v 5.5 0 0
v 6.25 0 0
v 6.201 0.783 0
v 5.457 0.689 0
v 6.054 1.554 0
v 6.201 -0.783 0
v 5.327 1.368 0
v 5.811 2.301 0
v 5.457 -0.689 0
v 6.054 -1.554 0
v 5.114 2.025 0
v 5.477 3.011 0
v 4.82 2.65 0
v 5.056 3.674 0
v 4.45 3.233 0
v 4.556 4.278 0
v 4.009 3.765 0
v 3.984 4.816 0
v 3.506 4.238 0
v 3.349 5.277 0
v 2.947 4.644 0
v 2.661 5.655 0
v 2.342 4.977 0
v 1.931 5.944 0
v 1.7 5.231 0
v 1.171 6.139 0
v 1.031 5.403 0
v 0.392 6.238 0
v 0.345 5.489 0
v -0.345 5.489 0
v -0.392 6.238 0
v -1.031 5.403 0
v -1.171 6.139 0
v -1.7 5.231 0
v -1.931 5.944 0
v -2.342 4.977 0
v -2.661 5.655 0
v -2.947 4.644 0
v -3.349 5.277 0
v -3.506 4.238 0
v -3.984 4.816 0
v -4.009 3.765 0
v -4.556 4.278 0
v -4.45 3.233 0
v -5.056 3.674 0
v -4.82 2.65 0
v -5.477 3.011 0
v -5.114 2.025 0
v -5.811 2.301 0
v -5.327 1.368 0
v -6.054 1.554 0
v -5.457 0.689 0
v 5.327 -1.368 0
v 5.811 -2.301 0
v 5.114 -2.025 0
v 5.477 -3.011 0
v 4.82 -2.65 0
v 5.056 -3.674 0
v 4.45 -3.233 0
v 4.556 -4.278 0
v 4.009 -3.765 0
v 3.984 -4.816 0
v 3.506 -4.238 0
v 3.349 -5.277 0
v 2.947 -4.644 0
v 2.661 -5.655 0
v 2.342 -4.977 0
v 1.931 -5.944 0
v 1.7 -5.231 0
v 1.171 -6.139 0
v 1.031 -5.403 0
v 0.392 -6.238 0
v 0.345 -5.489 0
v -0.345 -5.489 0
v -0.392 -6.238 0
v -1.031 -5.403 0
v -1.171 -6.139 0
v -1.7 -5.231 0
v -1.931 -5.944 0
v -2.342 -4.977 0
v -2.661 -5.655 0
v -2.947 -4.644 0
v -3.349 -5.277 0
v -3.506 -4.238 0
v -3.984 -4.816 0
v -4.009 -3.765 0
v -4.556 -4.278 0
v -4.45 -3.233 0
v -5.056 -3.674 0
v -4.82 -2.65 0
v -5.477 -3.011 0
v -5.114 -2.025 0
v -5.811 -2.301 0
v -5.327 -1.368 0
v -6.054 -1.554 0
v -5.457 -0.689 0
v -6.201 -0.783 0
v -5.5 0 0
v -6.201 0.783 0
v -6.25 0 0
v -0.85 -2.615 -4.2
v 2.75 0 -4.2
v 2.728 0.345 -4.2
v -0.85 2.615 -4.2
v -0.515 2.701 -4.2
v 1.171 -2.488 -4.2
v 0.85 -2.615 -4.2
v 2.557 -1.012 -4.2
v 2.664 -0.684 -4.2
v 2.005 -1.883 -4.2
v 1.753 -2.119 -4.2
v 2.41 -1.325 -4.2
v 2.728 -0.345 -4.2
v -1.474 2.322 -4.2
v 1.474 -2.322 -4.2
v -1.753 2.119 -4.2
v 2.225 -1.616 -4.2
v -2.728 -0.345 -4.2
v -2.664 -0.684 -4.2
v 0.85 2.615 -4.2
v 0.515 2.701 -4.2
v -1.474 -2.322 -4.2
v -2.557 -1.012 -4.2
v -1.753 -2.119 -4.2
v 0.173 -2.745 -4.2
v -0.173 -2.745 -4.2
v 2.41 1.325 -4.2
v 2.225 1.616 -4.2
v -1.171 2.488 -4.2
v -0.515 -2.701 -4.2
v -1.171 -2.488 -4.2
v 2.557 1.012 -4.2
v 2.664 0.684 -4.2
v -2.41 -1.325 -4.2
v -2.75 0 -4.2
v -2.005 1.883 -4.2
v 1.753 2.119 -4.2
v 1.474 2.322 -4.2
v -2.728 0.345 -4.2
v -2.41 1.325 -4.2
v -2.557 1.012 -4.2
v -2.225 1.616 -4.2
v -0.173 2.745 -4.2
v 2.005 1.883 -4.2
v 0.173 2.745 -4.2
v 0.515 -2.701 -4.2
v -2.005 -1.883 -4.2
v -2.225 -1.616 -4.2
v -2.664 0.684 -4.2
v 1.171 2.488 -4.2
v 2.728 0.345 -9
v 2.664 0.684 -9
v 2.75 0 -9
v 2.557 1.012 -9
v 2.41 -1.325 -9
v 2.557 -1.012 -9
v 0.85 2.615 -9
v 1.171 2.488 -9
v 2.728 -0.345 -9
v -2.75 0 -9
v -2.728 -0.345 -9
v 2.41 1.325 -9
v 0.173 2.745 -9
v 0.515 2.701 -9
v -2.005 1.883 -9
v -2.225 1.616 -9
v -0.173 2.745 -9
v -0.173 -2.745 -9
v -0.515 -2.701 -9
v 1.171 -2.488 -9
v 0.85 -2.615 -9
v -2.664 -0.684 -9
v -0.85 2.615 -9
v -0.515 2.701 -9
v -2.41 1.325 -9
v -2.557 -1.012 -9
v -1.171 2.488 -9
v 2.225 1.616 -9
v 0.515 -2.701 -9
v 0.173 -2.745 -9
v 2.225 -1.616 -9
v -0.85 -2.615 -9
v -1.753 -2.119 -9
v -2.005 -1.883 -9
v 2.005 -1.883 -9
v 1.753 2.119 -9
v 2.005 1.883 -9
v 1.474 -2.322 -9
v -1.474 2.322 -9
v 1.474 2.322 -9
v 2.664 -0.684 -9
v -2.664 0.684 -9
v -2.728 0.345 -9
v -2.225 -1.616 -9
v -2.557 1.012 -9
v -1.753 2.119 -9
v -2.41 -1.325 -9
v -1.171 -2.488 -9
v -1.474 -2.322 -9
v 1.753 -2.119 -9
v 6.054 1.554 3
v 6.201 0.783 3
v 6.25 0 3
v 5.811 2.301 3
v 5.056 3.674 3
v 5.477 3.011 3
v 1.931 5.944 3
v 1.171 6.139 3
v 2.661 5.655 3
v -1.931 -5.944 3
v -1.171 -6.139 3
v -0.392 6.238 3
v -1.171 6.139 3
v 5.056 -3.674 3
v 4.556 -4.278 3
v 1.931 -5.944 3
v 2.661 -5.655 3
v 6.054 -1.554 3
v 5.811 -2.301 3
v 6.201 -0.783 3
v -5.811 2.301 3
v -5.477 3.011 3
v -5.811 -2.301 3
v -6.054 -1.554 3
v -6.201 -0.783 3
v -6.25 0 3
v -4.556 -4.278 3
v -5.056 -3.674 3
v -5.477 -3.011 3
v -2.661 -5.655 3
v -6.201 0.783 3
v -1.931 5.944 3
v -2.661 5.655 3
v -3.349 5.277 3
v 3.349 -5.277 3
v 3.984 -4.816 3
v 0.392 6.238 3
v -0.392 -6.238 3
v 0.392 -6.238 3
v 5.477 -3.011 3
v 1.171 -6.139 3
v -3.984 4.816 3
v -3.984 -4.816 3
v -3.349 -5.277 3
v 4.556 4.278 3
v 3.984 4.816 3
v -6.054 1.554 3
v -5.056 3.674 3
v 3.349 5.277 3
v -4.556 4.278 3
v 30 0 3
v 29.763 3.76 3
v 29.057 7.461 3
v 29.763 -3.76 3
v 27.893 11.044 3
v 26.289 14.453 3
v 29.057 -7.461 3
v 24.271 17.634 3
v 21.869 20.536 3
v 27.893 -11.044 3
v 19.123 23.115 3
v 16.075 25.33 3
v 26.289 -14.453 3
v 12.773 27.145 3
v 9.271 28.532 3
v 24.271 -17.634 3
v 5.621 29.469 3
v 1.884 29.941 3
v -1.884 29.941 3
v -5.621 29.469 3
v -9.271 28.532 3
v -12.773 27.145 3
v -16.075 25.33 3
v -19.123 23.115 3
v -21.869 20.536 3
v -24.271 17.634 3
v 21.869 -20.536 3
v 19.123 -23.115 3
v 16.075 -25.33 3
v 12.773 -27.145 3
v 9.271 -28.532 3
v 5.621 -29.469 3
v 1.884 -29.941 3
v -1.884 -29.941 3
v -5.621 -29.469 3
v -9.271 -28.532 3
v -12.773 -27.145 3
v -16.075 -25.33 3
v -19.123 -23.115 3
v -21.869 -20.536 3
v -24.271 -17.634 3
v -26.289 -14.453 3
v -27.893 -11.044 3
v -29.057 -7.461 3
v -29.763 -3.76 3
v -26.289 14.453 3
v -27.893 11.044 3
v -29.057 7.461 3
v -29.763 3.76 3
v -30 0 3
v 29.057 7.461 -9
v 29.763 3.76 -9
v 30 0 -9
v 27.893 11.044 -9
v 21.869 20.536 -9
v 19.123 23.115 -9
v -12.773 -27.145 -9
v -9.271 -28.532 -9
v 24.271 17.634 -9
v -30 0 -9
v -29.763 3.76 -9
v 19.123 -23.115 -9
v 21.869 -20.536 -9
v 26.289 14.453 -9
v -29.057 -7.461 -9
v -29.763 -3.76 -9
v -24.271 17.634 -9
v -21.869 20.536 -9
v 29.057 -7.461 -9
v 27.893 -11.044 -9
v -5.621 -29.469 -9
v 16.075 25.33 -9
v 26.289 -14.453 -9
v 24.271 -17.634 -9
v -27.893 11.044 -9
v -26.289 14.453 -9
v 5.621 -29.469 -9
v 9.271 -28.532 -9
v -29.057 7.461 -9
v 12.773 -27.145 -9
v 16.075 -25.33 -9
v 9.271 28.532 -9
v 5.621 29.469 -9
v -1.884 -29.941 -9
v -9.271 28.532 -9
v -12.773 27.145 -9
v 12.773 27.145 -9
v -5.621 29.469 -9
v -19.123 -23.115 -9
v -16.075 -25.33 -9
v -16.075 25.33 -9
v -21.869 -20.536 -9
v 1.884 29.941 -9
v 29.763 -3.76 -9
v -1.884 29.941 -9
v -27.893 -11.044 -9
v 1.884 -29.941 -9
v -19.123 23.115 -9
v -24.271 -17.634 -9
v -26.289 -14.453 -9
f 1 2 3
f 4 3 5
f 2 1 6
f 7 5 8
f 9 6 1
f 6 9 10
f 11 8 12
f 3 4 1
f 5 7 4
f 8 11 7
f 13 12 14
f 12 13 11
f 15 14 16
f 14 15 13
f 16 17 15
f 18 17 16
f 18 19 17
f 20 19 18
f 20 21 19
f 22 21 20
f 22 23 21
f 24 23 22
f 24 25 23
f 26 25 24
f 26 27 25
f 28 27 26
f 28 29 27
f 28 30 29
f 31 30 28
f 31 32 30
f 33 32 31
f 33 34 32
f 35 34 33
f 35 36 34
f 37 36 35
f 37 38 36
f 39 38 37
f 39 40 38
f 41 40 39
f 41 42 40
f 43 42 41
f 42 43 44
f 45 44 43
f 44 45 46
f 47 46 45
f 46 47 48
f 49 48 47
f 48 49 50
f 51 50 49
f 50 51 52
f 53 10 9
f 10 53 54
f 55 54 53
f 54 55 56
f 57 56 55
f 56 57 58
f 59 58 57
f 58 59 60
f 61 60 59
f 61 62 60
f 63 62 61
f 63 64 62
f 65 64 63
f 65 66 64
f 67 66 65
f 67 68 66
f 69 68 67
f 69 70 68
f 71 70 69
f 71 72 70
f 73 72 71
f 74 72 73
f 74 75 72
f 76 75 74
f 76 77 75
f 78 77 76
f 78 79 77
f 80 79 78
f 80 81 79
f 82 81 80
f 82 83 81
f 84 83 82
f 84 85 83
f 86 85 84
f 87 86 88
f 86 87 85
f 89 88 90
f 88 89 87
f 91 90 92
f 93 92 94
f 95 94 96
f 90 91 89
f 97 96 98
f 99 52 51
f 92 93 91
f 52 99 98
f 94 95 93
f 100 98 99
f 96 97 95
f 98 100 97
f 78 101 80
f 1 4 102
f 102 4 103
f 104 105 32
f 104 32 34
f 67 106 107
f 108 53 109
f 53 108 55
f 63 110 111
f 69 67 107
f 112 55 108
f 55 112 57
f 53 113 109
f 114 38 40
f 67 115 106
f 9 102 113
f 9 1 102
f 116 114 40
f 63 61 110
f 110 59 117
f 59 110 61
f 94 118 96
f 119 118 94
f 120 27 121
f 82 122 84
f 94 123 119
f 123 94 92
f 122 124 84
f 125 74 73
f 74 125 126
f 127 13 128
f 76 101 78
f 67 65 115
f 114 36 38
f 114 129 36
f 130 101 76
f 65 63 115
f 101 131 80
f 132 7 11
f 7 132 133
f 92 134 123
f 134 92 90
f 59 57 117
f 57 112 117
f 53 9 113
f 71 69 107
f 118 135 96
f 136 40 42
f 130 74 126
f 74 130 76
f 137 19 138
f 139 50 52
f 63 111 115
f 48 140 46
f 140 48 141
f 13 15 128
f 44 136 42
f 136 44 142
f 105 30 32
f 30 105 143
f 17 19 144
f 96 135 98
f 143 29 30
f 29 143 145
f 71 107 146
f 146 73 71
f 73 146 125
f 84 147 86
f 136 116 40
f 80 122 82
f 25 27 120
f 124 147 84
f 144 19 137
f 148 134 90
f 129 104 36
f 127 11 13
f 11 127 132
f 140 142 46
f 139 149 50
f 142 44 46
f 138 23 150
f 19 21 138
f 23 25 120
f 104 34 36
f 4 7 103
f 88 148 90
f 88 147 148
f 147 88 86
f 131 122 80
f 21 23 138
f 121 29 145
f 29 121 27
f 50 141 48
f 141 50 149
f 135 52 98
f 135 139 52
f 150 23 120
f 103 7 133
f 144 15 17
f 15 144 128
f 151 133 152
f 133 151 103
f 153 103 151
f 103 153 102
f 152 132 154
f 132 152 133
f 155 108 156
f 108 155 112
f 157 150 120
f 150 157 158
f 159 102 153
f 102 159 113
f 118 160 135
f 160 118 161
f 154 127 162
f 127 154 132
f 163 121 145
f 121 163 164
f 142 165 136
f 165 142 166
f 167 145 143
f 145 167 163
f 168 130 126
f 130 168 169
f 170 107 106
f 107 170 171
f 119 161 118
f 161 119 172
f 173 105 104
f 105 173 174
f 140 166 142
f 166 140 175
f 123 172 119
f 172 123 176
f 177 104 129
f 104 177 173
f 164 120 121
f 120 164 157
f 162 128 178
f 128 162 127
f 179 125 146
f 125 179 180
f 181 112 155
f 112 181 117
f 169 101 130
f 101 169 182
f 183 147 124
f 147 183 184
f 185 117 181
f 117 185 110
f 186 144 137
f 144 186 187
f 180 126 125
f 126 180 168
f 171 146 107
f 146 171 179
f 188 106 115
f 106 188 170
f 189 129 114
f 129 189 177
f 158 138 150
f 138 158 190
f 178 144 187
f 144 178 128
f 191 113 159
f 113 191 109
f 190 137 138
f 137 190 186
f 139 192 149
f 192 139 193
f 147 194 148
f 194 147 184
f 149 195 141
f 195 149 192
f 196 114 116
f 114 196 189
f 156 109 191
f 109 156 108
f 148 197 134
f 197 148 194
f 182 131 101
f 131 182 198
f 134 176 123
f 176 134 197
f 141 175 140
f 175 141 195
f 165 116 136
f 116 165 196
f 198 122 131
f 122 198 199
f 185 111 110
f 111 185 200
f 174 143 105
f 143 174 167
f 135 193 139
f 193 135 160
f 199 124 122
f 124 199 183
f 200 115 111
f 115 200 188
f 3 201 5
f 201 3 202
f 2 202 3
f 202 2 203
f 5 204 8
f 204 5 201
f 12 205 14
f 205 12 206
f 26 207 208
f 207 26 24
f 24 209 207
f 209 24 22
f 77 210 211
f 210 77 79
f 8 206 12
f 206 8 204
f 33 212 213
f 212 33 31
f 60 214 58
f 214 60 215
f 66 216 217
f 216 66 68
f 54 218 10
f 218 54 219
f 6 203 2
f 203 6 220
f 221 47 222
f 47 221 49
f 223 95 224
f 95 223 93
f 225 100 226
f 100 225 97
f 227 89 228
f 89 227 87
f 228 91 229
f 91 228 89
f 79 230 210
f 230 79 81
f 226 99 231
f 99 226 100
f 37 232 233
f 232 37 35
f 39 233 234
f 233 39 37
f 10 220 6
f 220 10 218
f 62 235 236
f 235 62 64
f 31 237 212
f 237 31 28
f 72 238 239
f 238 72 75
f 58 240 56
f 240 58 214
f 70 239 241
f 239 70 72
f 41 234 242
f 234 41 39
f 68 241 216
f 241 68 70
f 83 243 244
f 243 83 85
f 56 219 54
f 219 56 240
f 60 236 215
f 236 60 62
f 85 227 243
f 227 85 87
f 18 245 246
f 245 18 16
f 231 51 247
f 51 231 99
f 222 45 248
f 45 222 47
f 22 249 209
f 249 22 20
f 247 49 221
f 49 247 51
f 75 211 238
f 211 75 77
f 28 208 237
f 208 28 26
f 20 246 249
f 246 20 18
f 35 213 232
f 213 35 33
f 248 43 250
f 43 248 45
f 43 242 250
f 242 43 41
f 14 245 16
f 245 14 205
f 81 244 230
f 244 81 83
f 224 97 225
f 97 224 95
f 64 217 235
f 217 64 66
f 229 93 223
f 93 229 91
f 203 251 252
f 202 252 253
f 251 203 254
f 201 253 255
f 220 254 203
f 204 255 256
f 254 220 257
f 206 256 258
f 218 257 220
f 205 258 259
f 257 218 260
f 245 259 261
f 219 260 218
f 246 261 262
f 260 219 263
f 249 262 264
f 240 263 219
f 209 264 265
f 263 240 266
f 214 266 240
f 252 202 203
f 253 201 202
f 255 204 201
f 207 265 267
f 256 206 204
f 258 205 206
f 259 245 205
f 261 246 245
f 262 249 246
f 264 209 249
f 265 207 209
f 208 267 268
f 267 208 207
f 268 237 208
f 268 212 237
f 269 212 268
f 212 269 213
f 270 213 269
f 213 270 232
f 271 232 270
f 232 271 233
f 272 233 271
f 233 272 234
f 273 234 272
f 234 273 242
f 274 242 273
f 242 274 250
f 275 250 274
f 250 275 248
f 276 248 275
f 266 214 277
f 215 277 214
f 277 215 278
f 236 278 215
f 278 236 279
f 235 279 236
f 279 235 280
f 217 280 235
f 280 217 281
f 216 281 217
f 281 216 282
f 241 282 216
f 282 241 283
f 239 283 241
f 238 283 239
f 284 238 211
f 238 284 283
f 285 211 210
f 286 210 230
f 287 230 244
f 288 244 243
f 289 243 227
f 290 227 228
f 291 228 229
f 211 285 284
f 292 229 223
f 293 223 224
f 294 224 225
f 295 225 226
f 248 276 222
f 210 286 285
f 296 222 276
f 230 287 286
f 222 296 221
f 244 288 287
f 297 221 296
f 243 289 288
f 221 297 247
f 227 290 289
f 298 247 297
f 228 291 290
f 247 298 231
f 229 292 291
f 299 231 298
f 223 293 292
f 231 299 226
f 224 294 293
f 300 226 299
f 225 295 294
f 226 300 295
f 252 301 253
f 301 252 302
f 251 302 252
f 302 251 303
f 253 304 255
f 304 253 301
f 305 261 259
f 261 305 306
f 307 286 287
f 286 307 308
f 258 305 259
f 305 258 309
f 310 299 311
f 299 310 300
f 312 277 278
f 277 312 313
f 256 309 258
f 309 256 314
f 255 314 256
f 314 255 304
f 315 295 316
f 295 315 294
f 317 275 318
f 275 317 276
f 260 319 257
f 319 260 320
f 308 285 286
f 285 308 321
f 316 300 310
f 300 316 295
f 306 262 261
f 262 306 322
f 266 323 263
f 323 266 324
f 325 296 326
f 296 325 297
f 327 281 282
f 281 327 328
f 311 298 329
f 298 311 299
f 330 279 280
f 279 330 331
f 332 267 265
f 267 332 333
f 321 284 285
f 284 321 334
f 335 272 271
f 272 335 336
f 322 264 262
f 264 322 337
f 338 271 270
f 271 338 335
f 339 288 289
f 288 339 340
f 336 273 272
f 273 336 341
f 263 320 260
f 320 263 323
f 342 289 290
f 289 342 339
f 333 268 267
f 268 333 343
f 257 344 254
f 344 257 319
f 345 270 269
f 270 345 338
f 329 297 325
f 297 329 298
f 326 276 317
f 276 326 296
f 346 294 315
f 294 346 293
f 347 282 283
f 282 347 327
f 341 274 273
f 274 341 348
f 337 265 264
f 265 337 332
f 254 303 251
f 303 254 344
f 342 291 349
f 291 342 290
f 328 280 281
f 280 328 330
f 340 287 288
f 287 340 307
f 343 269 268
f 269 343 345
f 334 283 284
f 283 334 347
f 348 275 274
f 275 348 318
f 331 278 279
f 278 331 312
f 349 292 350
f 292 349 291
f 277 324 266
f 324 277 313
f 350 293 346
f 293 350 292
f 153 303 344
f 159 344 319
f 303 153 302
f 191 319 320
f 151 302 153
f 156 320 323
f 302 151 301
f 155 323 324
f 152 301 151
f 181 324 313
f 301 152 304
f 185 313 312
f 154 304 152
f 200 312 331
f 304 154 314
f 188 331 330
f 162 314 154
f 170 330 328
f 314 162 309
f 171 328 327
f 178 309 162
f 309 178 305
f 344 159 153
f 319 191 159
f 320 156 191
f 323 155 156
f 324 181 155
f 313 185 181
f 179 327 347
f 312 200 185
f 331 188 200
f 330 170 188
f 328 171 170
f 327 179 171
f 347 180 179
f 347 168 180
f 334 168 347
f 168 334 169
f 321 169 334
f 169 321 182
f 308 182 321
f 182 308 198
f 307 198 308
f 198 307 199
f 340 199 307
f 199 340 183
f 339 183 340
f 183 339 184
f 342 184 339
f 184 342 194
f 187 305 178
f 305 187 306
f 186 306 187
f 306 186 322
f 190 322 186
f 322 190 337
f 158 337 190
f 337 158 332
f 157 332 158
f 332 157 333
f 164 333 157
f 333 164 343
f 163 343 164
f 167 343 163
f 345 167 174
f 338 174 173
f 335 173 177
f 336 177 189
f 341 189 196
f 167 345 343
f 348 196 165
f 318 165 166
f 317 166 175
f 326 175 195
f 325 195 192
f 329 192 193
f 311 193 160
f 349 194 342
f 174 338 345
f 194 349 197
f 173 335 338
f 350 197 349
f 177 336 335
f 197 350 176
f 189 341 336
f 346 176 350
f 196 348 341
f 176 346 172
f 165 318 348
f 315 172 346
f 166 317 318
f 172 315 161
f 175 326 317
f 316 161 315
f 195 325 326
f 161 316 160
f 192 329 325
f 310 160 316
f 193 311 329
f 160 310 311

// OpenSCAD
$fn = 50;


difference() {
	union() {
		translate(v = [0, 0, -9.0000000000]) {
			cylinder(h = 12, r = 30.0000000000);
		}
	}
	union() {
		translate(v = [0, 0, 0]) {
			rotate(a = [0, 0, 0]) {
				difference() {
					union() {
						translate(v = [0, 0, -12.0000000000]) {
							cylinder(h = 12, r = 2.2500000000);
						}
						translate(v = [0, 0, -4.2000000000]) {
							cylinder(h = 4.2000000000, r1 = 2.7500000000, r2 = 5.5000000000);
						}
						translate(v = [0, 0, -12.0000000000]) {
							cylinder(h = 12, r = 2.7500000000);
						}
						translate(v = [0, 0, -12.0000000000]) {
							cylinder(h = 12, r = 2.2500000000);
						}
					}
					union();
				}
			}
		}
		#cylinder(h = 3, r = 6.2500000000);
	}
}
